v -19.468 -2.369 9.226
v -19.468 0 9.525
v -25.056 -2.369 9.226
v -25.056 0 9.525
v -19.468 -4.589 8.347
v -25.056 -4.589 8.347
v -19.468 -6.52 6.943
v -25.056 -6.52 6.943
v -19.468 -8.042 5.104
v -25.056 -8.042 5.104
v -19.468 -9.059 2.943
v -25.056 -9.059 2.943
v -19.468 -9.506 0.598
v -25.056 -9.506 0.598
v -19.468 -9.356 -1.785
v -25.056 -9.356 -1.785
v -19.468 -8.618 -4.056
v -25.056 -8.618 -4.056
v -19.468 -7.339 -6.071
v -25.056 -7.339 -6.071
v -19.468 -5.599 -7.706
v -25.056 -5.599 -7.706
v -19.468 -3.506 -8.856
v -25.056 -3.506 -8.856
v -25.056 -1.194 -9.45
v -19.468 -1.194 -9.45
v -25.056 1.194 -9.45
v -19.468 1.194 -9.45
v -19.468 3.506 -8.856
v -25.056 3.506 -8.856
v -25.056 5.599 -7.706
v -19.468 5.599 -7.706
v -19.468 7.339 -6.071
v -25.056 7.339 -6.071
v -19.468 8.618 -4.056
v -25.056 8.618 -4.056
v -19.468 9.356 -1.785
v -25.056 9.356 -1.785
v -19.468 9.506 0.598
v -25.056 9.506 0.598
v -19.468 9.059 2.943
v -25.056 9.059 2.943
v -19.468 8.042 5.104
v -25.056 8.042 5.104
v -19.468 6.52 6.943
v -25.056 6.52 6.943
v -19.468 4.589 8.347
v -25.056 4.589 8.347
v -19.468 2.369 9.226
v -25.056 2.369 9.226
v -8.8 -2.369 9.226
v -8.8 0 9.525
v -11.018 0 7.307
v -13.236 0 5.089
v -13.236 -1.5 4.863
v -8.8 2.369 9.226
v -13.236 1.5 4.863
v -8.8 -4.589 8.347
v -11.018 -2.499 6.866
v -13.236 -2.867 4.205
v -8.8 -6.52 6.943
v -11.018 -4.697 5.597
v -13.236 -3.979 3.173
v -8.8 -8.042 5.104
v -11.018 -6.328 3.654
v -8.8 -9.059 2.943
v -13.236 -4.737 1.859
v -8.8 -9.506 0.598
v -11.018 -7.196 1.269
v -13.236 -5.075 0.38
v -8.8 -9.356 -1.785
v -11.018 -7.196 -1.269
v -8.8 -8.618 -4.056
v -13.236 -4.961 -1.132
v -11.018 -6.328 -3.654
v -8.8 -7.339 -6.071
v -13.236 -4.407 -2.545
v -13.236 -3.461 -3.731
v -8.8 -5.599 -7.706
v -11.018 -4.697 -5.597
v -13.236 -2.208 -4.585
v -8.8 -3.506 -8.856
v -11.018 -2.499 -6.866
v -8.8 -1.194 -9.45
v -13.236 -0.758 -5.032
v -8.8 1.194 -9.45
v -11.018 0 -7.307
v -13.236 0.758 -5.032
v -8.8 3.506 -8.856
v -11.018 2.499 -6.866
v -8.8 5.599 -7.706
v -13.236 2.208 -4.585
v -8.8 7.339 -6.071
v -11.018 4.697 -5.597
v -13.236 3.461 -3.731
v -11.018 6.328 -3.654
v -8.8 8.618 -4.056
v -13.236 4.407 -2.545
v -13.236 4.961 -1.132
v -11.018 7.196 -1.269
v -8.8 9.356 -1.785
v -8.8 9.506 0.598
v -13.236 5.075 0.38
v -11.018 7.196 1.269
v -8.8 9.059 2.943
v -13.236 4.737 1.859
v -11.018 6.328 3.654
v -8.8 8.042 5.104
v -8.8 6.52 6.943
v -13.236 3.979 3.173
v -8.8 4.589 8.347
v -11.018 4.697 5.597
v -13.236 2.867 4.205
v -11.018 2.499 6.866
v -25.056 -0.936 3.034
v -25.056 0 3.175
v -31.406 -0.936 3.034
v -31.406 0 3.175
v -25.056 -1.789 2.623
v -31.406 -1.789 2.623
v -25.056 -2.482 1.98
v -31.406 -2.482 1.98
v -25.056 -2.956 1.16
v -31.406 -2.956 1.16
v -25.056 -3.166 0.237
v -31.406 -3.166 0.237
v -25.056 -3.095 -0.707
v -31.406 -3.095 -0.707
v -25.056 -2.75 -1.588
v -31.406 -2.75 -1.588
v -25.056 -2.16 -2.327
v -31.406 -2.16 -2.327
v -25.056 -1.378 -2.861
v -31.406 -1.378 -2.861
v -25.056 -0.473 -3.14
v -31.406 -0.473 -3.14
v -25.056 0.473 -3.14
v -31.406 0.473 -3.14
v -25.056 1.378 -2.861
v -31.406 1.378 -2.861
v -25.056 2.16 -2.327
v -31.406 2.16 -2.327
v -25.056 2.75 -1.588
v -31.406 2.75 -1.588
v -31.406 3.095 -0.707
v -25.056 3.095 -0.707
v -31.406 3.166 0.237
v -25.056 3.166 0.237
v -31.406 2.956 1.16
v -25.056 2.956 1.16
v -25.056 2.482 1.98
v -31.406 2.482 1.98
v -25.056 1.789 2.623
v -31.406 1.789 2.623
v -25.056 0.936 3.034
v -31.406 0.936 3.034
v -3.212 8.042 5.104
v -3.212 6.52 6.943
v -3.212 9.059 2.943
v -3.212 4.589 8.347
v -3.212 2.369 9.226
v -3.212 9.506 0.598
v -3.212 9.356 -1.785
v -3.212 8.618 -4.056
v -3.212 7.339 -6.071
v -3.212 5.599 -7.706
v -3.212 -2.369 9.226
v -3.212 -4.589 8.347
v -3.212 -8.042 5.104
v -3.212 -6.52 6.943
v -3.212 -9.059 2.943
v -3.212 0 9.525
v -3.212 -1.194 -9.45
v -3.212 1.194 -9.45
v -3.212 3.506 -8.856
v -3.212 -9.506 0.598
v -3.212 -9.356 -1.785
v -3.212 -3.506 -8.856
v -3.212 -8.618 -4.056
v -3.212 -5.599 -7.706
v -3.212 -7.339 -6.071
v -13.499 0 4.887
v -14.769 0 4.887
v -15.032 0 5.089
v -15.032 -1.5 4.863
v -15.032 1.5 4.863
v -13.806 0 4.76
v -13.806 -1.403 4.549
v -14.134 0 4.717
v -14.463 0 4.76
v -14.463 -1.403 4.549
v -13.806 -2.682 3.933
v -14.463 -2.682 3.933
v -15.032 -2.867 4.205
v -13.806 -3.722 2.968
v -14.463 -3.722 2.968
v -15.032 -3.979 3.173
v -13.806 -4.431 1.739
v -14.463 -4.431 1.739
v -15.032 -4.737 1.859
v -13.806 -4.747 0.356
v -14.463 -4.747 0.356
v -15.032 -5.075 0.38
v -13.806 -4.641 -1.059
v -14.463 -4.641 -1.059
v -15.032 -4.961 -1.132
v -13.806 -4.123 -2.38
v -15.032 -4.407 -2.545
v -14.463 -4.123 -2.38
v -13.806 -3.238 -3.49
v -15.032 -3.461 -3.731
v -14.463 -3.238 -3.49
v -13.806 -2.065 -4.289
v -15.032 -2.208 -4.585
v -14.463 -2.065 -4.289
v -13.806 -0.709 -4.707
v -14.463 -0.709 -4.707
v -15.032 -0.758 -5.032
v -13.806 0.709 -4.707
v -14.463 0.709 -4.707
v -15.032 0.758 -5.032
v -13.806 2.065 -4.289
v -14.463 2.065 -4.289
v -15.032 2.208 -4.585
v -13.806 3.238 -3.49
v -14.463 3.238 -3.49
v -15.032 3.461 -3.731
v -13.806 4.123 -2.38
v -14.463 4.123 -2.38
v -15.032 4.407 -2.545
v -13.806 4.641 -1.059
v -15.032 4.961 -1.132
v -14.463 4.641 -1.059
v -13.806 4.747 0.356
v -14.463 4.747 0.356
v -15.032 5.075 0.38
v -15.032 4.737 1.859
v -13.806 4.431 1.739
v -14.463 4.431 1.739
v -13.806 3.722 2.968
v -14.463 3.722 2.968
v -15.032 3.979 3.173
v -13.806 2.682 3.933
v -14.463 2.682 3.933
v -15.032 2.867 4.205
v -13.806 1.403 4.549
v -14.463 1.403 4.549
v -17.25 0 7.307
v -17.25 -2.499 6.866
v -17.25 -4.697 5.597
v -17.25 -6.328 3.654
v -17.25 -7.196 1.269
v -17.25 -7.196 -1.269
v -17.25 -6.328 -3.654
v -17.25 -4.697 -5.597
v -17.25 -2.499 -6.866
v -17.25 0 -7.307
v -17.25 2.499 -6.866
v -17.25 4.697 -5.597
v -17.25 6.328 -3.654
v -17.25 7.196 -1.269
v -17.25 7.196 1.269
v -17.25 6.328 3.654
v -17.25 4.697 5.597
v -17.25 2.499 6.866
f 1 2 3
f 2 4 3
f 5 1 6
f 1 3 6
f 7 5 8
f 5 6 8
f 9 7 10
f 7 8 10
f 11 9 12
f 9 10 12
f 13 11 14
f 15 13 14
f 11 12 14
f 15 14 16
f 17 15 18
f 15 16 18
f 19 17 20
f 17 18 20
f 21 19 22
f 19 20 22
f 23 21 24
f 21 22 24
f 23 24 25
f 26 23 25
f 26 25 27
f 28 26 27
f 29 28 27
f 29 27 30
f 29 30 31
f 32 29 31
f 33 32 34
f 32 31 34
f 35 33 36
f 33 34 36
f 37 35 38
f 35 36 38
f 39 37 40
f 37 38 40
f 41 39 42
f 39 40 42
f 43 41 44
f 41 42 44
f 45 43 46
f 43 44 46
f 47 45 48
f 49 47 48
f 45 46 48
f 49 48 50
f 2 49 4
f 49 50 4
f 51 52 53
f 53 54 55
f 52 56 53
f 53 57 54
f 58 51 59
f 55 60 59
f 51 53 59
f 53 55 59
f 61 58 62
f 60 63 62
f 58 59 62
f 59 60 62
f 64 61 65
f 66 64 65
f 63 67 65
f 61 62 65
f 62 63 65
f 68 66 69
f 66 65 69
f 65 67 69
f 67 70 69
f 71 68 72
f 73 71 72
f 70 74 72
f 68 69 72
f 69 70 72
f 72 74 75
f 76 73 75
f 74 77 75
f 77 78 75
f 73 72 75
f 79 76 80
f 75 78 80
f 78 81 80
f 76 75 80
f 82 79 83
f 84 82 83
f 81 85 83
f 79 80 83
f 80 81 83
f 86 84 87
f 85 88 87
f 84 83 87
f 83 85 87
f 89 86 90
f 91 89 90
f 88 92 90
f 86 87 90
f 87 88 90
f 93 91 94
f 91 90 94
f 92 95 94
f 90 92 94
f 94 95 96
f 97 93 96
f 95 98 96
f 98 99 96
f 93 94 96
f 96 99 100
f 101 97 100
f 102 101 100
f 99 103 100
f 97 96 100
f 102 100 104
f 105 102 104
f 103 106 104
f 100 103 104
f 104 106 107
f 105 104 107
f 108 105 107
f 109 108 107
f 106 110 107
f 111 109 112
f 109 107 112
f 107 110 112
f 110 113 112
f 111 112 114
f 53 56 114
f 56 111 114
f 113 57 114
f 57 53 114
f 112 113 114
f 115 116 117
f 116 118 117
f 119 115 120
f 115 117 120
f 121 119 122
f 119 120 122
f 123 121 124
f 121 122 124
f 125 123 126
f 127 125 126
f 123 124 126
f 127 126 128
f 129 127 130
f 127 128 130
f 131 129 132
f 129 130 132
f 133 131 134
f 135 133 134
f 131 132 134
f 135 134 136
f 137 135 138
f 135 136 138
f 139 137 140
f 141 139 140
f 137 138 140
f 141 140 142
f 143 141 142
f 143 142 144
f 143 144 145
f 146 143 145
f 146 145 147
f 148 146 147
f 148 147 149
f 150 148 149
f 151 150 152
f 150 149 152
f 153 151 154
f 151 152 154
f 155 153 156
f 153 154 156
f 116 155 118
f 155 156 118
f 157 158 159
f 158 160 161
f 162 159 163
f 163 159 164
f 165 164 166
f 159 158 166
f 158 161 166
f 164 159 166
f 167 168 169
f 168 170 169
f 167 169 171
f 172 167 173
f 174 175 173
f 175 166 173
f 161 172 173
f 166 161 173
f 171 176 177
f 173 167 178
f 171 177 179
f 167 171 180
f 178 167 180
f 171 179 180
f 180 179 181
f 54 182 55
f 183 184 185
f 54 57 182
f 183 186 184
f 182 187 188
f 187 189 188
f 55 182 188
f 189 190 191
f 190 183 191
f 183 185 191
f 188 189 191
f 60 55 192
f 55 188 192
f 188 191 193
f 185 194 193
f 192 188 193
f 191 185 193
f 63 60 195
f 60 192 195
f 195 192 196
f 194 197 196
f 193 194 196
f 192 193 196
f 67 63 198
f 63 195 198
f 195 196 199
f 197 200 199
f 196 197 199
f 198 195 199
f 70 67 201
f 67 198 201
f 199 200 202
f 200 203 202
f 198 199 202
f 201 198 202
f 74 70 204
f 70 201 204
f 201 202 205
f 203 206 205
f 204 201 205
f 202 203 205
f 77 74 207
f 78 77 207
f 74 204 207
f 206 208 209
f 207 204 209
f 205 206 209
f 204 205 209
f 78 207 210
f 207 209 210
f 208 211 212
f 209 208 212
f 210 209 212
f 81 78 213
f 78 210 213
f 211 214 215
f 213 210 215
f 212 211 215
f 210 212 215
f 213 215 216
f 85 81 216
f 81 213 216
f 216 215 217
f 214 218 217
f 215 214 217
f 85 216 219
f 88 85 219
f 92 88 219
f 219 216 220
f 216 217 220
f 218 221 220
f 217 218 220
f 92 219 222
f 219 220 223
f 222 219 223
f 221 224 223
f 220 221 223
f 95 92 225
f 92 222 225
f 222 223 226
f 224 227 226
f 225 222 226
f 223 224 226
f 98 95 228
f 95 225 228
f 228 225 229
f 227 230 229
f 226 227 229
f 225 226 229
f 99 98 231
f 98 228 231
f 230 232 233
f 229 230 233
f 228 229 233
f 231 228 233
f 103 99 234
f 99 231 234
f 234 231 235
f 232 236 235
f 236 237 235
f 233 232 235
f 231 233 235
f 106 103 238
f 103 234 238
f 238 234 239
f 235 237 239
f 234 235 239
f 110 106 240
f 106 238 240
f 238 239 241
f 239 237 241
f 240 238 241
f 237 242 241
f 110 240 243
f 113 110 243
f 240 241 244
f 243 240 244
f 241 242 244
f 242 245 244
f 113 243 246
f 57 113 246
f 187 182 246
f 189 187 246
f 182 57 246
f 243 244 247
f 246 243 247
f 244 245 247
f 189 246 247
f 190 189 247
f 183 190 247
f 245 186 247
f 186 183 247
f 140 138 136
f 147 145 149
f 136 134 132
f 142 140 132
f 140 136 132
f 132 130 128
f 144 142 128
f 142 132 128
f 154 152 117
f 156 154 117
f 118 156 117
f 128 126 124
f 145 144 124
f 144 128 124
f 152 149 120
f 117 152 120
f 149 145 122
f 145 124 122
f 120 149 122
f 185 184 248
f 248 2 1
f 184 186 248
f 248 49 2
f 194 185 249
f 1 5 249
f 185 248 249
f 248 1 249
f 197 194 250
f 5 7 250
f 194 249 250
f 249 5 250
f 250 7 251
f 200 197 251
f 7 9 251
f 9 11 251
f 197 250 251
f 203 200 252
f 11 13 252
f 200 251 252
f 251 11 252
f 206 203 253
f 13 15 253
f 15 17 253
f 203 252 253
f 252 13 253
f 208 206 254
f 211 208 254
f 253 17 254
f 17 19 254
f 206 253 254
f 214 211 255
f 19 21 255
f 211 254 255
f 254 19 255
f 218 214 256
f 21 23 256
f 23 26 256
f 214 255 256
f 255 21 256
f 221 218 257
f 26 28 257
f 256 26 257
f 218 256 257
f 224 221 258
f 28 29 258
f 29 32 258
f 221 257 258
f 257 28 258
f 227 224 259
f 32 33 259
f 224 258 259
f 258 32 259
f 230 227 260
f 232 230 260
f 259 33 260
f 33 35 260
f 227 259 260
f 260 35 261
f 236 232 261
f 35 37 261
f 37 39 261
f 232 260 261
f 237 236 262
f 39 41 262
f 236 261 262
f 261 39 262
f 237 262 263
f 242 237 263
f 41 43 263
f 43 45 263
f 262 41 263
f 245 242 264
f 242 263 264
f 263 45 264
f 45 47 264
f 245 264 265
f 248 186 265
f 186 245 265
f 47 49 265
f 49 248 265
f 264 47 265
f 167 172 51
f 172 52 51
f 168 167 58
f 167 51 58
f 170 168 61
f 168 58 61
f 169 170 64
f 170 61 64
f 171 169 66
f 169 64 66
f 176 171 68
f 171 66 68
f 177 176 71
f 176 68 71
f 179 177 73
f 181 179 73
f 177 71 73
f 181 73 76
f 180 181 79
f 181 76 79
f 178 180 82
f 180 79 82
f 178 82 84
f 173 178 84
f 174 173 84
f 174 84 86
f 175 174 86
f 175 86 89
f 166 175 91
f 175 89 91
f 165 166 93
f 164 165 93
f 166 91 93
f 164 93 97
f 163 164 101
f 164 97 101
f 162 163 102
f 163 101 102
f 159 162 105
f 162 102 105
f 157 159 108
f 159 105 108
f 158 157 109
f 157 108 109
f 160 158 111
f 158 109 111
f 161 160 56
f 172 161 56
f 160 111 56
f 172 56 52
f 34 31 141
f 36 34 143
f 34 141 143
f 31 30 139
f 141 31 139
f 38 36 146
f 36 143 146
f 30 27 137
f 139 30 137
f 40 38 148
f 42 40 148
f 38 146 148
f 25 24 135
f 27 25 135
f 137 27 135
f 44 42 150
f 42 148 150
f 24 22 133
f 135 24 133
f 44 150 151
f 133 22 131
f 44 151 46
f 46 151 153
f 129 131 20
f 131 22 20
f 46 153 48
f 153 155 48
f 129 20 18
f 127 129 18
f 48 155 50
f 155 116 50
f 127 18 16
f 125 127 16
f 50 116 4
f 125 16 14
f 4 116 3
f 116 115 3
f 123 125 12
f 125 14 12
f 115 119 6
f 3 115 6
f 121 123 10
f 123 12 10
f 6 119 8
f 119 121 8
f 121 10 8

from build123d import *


with BuildPart() as f1:
    # F0 (on Front) → F1 (revolve)
    with BuildSketch(Plane.XZ):
        with BuildLine():
            Line((-31.406309, 0), (-3.212309, 0))
            Line((-3.212309, 0), (-3.212309, 9.525))
            Line((-3.212309, 9.525), (-8.800309, 9.525))
            Line((-8.800309, 9.525), (-13.236284, 5.089026))
            ThreePointArc((-13.236284, 5.089026), (-14.134309, 4.717051), (-15.032335, 5.089026))
            Line((-15.032335, 5.089026), (-19.468309, 9.525))
            Line((-19.468309, 9.525), (-25.056309, 9.525))
            Line((-25.056309, 9.525), (-25.056309, 3.175))
            Line((-25.056309, 3.175), (-31.406309, 3.175))
            Line((-31.406309, 3.175), (-31.406309, 0))
        make_face()
    revolve(axis=Axis((-44.154793, 0, 0), (1, 0, 0)))


solid = f1.part
